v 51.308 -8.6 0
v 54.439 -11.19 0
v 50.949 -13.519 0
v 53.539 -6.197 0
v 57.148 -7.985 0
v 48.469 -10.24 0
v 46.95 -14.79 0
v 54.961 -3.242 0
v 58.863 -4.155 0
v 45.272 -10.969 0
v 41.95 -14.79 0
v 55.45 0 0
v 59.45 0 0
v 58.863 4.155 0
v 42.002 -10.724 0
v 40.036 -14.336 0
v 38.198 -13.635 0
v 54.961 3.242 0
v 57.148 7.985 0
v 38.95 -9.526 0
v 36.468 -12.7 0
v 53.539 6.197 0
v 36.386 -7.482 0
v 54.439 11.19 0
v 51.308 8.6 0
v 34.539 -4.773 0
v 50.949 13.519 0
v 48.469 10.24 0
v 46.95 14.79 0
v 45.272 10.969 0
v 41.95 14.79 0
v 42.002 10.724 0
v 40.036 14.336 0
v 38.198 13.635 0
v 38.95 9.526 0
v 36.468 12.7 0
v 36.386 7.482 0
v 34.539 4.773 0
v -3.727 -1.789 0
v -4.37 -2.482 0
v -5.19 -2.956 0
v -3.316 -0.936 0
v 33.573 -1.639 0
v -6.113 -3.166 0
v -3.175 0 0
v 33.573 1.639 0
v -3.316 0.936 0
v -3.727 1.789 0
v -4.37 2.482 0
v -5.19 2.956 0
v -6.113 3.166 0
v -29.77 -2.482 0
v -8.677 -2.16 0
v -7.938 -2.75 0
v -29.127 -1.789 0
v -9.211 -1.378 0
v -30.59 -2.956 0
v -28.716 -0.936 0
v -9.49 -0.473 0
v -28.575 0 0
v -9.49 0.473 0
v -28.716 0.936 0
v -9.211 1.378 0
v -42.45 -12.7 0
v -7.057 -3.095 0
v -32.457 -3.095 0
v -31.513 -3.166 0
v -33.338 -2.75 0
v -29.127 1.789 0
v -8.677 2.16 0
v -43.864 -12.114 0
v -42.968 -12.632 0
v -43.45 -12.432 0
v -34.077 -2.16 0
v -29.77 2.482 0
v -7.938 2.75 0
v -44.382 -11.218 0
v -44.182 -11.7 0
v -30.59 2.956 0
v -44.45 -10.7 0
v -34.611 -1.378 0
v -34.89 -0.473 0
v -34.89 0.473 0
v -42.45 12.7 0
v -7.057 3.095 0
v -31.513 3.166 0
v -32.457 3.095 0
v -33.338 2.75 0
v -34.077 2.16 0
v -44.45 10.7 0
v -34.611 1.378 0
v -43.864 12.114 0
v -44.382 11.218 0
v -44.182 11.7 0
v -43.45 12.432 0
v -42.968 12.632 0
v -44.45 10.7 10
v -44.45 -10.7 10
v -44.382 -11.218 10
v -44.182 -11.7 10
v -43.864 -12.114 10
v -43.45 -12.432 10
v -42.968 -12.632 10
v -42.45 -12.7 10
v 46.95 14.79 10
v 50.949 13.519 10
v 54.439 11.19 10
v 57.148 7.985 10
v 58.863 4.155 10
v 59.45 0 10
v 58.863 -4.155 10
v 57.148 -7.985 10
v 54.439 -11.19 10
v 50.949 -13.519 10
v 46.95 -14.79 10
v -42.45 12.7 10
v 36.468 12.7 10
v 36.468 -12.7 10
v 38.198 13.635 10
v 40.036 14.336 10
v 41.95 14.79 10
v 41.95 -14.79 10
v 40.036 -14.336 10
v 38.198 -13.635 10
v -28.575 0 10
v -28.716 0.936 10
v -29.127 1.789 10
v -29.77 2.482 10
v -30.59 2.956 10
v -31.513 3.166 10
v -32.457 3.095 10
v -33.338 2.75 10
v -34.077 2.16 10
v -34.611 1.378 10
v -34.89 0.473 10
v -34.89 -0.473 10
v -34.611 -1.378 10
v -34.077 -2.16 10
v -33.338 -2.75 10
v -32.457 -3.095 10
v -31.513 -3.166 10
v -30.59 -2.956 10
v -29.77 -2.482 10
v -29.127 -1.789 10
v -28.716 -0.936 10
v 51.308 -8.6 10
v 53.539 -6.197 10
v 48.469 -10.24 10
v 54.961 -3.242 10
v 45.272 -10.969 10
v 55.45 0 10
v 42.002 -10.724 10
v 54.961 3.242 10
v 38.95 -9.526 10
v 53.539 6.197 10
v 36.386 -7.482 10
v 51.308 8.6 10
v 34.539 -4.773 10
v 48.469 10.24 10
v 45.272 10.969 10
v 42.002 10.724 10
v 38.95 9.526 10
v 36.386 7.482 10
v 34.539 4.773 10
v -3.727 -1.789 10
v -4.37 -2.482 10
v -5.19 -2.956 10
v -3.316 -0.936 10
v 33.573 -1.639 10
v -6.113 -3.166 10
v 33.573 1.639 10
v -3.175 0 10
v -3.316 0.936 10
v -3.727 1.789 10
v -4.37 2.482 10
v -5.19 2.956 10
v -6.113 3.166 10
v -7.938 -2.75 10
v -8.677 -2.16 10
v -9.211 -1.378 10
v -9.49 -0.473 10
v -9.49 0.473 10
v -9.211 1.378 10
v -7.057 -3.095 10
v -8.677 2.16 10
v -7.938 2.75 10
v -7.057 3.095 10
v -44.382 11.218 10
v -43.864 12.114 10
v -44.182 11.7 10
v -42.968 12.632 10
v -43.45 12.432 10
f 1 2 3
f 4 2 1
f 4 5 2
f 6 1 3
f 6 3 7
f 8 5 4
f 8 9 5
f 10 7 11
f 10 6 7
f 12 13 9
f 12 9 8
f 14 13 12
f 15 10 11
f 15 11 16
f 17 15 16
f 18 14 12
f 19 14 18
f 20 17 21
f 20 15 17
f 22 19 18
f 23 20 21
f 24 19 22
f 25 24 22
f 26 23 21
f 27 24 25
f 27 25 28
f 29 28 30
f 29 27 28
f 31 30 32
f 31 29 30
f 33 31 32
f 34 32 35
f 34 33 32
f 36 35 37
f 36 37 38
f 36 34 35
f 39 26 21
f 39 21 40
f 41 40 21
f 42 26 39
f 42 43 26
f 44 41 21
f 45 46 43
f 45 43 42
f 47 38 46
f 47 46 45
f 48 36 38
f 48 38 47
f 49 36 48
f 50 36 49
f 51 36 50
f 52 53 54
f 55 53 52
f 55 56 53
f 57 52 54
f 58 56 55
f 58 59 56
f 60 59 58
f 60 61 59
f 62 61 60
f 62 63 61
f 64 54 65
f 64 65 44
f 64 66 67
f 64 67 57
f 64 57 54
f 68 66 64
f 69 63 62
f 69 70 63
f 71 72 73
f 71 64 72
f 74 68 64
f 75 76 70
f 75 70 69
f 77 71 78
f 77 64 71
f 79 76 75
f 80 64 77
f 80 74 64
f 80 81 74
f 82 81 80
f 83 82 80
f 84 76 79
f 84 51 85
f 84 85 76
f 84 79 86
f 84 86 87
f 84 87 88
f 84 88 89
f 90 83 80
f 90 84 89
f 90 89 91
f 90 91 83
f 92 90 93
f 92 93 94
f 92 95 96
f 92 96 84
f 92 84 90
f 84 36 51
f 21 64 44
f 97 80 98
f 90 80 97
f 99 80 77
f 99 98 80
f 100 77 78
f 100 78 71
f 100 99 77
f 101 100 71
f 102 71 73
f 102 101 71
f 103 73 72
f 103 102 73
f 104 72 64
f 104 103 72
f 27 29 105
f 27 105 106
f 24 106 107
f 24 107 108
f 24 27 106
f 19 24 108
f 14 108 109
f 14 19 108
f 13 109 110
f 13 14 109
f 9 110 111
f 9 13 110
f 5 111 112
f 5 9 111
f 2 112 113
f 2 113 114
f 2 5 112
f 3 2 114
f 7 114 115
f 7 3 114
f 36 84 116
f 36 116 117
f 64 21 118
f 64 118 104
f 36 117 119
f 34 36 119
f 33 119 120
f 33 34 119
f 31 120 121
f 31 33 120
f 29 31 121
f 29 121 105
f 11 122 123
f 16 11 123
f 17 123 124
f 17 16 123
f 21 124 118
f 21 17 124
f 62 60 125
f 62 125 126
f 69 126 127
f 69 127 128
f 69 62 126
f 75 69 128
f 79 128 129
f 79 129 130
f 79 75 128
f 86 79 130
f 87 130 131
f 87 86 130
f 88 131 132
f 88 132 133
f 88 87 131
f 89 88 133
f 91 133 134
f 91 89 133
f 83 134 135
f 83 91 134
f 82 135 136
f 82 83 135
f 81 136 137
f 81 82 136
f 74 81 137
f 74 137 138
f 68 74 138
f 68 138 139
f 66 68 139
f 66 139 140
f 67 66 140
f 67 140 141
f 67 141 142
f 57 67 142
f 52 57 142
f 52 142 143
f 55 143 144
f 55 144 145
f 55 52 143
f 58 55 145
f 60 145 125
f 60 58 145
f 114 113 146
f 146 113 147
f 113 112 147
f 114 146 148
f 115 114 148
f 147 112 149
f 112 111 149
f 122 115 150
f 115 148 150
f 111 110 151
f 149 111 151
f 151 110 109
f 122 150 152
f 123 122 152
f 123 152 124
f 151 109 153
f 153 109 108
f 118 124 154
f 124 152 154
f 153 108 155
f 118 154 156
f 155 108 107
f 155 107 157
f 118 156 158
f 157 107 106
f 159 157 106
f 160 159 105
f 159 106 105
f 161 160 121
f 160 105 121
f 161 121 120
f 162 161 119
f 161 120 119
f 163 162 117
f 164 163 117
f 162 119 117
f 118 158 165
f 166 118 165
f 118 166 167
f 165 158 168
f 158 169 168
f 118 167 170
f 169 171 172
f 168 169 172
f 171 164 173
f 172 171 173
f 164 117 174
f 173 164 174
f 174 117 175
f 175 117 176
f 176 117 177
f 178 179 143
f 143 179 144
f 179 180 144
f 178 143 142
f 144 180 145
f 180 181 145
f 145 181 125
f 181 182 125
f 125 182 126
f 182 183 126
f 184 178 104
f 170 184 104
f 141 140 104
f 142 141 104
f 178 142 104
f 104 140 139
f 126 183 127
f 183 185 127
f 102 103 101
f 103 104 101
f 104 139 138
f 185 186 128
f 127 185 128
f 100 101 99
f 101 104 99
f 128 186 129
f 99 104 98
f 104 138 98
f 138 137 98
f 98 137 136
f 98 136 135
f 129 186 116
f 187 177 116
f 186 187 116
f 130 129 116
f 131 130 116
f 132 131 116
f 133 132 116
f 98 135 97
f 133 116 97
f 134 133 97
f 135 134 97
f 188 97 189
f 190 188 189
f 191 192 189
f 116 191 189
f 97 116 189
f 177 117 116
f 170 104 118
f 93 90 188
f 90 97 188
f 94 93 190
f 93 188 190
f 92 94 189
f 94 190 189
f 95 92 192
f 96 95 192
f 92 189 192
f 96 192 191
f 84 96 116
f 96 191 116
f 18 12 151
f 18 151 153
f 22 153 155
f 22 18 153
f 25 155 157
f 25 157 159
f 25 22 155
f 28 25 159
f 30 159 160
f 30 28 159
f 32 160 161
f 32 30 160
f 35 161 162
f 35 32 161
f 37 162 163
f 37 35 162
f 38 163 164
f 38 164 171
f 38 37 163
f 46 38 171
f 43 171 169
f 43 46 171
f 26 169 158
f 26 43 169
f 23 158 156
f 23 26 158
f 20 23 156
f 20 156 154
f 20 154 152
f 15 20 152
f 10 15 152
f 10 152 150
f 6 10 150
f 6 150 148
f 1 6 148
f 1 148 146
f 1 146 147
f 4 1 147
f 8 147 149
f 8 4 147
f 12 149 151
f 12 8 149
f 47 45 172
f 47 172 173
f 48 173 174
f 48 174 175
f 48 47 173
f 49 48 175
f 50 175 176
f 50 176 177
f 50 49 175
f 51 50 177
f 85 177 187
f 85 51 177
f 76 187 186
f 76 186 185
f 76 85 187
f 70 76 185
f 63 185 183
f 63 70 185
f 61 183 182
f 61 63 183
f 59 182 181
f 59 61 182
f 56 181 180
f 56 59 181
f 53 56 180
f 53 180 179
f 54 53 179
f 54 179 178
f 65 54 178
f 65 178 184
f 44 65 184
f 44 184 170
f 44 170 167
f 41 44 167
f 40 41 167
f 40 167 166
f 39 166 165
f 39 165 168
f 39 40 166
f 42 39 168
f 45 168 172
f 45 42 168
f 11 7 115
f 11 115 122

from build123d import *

# Parameters (mm, degrees)
SKETCH1_R           = 3.175
SKETCH1_R_2         = 11
BOSS_EXTRUDE1_DEPTH = 10
FILLET3_R           = 2


with BuildPart() as part:
    # Sketch1 → Boss-Extrude1 (new body)
    with BuildSketch(Plane.XY):
        with BuildLine():
            Line((-44.45, -12.7), (-44.45, 12.7))
            Line((-44.45, 12.7), (36.468145579, 12.7))
            ThreePointArc((36.468145579, 12.7), (39.105886278, 14.015721477), (41.95, 14.790199458))
            Line((41.95, 14.790199458), (46.95, 14.790199458))
            ThreePointArc((46.95, 14.790199458), (59.45, 0), (46.95, -14.790199458))
            Line((46.95, -14.790199458), (41.95, -14.790199458))
            ThreePointArc((41.95, -14.790199458), (39.105886278, -14.015721477), (36.468145579, -12.7))
            Line((36.468145579, -12.7), (-44.45, -12.7))
        make_face()
        with Locations((-31.75, 0)):
            Circle(SKETCH1_R, mode=Mode.SUBTRACT)
        with Locations((44.45, 0)):
            Circle(SKETCH1_R_2, mode=Mode.SUBTRACT)
        with Locations((-6.35, 0)):
            Circle(SKETCH1_R, mode=Mode.SUBTRACT)
    extrude(amount=BOSS_EXTRUDE1_DEPTH)

    # Fillet3
    fillet3_edges = [part.edges().sort_by_distance(p)[0] for p in [
        (-44.45, -12.7, 5),
        (-44.45, 12.7, 5),
    ]]
    fillet(fillet3_edges, radius=FILLET3_R)


solid = part.part
